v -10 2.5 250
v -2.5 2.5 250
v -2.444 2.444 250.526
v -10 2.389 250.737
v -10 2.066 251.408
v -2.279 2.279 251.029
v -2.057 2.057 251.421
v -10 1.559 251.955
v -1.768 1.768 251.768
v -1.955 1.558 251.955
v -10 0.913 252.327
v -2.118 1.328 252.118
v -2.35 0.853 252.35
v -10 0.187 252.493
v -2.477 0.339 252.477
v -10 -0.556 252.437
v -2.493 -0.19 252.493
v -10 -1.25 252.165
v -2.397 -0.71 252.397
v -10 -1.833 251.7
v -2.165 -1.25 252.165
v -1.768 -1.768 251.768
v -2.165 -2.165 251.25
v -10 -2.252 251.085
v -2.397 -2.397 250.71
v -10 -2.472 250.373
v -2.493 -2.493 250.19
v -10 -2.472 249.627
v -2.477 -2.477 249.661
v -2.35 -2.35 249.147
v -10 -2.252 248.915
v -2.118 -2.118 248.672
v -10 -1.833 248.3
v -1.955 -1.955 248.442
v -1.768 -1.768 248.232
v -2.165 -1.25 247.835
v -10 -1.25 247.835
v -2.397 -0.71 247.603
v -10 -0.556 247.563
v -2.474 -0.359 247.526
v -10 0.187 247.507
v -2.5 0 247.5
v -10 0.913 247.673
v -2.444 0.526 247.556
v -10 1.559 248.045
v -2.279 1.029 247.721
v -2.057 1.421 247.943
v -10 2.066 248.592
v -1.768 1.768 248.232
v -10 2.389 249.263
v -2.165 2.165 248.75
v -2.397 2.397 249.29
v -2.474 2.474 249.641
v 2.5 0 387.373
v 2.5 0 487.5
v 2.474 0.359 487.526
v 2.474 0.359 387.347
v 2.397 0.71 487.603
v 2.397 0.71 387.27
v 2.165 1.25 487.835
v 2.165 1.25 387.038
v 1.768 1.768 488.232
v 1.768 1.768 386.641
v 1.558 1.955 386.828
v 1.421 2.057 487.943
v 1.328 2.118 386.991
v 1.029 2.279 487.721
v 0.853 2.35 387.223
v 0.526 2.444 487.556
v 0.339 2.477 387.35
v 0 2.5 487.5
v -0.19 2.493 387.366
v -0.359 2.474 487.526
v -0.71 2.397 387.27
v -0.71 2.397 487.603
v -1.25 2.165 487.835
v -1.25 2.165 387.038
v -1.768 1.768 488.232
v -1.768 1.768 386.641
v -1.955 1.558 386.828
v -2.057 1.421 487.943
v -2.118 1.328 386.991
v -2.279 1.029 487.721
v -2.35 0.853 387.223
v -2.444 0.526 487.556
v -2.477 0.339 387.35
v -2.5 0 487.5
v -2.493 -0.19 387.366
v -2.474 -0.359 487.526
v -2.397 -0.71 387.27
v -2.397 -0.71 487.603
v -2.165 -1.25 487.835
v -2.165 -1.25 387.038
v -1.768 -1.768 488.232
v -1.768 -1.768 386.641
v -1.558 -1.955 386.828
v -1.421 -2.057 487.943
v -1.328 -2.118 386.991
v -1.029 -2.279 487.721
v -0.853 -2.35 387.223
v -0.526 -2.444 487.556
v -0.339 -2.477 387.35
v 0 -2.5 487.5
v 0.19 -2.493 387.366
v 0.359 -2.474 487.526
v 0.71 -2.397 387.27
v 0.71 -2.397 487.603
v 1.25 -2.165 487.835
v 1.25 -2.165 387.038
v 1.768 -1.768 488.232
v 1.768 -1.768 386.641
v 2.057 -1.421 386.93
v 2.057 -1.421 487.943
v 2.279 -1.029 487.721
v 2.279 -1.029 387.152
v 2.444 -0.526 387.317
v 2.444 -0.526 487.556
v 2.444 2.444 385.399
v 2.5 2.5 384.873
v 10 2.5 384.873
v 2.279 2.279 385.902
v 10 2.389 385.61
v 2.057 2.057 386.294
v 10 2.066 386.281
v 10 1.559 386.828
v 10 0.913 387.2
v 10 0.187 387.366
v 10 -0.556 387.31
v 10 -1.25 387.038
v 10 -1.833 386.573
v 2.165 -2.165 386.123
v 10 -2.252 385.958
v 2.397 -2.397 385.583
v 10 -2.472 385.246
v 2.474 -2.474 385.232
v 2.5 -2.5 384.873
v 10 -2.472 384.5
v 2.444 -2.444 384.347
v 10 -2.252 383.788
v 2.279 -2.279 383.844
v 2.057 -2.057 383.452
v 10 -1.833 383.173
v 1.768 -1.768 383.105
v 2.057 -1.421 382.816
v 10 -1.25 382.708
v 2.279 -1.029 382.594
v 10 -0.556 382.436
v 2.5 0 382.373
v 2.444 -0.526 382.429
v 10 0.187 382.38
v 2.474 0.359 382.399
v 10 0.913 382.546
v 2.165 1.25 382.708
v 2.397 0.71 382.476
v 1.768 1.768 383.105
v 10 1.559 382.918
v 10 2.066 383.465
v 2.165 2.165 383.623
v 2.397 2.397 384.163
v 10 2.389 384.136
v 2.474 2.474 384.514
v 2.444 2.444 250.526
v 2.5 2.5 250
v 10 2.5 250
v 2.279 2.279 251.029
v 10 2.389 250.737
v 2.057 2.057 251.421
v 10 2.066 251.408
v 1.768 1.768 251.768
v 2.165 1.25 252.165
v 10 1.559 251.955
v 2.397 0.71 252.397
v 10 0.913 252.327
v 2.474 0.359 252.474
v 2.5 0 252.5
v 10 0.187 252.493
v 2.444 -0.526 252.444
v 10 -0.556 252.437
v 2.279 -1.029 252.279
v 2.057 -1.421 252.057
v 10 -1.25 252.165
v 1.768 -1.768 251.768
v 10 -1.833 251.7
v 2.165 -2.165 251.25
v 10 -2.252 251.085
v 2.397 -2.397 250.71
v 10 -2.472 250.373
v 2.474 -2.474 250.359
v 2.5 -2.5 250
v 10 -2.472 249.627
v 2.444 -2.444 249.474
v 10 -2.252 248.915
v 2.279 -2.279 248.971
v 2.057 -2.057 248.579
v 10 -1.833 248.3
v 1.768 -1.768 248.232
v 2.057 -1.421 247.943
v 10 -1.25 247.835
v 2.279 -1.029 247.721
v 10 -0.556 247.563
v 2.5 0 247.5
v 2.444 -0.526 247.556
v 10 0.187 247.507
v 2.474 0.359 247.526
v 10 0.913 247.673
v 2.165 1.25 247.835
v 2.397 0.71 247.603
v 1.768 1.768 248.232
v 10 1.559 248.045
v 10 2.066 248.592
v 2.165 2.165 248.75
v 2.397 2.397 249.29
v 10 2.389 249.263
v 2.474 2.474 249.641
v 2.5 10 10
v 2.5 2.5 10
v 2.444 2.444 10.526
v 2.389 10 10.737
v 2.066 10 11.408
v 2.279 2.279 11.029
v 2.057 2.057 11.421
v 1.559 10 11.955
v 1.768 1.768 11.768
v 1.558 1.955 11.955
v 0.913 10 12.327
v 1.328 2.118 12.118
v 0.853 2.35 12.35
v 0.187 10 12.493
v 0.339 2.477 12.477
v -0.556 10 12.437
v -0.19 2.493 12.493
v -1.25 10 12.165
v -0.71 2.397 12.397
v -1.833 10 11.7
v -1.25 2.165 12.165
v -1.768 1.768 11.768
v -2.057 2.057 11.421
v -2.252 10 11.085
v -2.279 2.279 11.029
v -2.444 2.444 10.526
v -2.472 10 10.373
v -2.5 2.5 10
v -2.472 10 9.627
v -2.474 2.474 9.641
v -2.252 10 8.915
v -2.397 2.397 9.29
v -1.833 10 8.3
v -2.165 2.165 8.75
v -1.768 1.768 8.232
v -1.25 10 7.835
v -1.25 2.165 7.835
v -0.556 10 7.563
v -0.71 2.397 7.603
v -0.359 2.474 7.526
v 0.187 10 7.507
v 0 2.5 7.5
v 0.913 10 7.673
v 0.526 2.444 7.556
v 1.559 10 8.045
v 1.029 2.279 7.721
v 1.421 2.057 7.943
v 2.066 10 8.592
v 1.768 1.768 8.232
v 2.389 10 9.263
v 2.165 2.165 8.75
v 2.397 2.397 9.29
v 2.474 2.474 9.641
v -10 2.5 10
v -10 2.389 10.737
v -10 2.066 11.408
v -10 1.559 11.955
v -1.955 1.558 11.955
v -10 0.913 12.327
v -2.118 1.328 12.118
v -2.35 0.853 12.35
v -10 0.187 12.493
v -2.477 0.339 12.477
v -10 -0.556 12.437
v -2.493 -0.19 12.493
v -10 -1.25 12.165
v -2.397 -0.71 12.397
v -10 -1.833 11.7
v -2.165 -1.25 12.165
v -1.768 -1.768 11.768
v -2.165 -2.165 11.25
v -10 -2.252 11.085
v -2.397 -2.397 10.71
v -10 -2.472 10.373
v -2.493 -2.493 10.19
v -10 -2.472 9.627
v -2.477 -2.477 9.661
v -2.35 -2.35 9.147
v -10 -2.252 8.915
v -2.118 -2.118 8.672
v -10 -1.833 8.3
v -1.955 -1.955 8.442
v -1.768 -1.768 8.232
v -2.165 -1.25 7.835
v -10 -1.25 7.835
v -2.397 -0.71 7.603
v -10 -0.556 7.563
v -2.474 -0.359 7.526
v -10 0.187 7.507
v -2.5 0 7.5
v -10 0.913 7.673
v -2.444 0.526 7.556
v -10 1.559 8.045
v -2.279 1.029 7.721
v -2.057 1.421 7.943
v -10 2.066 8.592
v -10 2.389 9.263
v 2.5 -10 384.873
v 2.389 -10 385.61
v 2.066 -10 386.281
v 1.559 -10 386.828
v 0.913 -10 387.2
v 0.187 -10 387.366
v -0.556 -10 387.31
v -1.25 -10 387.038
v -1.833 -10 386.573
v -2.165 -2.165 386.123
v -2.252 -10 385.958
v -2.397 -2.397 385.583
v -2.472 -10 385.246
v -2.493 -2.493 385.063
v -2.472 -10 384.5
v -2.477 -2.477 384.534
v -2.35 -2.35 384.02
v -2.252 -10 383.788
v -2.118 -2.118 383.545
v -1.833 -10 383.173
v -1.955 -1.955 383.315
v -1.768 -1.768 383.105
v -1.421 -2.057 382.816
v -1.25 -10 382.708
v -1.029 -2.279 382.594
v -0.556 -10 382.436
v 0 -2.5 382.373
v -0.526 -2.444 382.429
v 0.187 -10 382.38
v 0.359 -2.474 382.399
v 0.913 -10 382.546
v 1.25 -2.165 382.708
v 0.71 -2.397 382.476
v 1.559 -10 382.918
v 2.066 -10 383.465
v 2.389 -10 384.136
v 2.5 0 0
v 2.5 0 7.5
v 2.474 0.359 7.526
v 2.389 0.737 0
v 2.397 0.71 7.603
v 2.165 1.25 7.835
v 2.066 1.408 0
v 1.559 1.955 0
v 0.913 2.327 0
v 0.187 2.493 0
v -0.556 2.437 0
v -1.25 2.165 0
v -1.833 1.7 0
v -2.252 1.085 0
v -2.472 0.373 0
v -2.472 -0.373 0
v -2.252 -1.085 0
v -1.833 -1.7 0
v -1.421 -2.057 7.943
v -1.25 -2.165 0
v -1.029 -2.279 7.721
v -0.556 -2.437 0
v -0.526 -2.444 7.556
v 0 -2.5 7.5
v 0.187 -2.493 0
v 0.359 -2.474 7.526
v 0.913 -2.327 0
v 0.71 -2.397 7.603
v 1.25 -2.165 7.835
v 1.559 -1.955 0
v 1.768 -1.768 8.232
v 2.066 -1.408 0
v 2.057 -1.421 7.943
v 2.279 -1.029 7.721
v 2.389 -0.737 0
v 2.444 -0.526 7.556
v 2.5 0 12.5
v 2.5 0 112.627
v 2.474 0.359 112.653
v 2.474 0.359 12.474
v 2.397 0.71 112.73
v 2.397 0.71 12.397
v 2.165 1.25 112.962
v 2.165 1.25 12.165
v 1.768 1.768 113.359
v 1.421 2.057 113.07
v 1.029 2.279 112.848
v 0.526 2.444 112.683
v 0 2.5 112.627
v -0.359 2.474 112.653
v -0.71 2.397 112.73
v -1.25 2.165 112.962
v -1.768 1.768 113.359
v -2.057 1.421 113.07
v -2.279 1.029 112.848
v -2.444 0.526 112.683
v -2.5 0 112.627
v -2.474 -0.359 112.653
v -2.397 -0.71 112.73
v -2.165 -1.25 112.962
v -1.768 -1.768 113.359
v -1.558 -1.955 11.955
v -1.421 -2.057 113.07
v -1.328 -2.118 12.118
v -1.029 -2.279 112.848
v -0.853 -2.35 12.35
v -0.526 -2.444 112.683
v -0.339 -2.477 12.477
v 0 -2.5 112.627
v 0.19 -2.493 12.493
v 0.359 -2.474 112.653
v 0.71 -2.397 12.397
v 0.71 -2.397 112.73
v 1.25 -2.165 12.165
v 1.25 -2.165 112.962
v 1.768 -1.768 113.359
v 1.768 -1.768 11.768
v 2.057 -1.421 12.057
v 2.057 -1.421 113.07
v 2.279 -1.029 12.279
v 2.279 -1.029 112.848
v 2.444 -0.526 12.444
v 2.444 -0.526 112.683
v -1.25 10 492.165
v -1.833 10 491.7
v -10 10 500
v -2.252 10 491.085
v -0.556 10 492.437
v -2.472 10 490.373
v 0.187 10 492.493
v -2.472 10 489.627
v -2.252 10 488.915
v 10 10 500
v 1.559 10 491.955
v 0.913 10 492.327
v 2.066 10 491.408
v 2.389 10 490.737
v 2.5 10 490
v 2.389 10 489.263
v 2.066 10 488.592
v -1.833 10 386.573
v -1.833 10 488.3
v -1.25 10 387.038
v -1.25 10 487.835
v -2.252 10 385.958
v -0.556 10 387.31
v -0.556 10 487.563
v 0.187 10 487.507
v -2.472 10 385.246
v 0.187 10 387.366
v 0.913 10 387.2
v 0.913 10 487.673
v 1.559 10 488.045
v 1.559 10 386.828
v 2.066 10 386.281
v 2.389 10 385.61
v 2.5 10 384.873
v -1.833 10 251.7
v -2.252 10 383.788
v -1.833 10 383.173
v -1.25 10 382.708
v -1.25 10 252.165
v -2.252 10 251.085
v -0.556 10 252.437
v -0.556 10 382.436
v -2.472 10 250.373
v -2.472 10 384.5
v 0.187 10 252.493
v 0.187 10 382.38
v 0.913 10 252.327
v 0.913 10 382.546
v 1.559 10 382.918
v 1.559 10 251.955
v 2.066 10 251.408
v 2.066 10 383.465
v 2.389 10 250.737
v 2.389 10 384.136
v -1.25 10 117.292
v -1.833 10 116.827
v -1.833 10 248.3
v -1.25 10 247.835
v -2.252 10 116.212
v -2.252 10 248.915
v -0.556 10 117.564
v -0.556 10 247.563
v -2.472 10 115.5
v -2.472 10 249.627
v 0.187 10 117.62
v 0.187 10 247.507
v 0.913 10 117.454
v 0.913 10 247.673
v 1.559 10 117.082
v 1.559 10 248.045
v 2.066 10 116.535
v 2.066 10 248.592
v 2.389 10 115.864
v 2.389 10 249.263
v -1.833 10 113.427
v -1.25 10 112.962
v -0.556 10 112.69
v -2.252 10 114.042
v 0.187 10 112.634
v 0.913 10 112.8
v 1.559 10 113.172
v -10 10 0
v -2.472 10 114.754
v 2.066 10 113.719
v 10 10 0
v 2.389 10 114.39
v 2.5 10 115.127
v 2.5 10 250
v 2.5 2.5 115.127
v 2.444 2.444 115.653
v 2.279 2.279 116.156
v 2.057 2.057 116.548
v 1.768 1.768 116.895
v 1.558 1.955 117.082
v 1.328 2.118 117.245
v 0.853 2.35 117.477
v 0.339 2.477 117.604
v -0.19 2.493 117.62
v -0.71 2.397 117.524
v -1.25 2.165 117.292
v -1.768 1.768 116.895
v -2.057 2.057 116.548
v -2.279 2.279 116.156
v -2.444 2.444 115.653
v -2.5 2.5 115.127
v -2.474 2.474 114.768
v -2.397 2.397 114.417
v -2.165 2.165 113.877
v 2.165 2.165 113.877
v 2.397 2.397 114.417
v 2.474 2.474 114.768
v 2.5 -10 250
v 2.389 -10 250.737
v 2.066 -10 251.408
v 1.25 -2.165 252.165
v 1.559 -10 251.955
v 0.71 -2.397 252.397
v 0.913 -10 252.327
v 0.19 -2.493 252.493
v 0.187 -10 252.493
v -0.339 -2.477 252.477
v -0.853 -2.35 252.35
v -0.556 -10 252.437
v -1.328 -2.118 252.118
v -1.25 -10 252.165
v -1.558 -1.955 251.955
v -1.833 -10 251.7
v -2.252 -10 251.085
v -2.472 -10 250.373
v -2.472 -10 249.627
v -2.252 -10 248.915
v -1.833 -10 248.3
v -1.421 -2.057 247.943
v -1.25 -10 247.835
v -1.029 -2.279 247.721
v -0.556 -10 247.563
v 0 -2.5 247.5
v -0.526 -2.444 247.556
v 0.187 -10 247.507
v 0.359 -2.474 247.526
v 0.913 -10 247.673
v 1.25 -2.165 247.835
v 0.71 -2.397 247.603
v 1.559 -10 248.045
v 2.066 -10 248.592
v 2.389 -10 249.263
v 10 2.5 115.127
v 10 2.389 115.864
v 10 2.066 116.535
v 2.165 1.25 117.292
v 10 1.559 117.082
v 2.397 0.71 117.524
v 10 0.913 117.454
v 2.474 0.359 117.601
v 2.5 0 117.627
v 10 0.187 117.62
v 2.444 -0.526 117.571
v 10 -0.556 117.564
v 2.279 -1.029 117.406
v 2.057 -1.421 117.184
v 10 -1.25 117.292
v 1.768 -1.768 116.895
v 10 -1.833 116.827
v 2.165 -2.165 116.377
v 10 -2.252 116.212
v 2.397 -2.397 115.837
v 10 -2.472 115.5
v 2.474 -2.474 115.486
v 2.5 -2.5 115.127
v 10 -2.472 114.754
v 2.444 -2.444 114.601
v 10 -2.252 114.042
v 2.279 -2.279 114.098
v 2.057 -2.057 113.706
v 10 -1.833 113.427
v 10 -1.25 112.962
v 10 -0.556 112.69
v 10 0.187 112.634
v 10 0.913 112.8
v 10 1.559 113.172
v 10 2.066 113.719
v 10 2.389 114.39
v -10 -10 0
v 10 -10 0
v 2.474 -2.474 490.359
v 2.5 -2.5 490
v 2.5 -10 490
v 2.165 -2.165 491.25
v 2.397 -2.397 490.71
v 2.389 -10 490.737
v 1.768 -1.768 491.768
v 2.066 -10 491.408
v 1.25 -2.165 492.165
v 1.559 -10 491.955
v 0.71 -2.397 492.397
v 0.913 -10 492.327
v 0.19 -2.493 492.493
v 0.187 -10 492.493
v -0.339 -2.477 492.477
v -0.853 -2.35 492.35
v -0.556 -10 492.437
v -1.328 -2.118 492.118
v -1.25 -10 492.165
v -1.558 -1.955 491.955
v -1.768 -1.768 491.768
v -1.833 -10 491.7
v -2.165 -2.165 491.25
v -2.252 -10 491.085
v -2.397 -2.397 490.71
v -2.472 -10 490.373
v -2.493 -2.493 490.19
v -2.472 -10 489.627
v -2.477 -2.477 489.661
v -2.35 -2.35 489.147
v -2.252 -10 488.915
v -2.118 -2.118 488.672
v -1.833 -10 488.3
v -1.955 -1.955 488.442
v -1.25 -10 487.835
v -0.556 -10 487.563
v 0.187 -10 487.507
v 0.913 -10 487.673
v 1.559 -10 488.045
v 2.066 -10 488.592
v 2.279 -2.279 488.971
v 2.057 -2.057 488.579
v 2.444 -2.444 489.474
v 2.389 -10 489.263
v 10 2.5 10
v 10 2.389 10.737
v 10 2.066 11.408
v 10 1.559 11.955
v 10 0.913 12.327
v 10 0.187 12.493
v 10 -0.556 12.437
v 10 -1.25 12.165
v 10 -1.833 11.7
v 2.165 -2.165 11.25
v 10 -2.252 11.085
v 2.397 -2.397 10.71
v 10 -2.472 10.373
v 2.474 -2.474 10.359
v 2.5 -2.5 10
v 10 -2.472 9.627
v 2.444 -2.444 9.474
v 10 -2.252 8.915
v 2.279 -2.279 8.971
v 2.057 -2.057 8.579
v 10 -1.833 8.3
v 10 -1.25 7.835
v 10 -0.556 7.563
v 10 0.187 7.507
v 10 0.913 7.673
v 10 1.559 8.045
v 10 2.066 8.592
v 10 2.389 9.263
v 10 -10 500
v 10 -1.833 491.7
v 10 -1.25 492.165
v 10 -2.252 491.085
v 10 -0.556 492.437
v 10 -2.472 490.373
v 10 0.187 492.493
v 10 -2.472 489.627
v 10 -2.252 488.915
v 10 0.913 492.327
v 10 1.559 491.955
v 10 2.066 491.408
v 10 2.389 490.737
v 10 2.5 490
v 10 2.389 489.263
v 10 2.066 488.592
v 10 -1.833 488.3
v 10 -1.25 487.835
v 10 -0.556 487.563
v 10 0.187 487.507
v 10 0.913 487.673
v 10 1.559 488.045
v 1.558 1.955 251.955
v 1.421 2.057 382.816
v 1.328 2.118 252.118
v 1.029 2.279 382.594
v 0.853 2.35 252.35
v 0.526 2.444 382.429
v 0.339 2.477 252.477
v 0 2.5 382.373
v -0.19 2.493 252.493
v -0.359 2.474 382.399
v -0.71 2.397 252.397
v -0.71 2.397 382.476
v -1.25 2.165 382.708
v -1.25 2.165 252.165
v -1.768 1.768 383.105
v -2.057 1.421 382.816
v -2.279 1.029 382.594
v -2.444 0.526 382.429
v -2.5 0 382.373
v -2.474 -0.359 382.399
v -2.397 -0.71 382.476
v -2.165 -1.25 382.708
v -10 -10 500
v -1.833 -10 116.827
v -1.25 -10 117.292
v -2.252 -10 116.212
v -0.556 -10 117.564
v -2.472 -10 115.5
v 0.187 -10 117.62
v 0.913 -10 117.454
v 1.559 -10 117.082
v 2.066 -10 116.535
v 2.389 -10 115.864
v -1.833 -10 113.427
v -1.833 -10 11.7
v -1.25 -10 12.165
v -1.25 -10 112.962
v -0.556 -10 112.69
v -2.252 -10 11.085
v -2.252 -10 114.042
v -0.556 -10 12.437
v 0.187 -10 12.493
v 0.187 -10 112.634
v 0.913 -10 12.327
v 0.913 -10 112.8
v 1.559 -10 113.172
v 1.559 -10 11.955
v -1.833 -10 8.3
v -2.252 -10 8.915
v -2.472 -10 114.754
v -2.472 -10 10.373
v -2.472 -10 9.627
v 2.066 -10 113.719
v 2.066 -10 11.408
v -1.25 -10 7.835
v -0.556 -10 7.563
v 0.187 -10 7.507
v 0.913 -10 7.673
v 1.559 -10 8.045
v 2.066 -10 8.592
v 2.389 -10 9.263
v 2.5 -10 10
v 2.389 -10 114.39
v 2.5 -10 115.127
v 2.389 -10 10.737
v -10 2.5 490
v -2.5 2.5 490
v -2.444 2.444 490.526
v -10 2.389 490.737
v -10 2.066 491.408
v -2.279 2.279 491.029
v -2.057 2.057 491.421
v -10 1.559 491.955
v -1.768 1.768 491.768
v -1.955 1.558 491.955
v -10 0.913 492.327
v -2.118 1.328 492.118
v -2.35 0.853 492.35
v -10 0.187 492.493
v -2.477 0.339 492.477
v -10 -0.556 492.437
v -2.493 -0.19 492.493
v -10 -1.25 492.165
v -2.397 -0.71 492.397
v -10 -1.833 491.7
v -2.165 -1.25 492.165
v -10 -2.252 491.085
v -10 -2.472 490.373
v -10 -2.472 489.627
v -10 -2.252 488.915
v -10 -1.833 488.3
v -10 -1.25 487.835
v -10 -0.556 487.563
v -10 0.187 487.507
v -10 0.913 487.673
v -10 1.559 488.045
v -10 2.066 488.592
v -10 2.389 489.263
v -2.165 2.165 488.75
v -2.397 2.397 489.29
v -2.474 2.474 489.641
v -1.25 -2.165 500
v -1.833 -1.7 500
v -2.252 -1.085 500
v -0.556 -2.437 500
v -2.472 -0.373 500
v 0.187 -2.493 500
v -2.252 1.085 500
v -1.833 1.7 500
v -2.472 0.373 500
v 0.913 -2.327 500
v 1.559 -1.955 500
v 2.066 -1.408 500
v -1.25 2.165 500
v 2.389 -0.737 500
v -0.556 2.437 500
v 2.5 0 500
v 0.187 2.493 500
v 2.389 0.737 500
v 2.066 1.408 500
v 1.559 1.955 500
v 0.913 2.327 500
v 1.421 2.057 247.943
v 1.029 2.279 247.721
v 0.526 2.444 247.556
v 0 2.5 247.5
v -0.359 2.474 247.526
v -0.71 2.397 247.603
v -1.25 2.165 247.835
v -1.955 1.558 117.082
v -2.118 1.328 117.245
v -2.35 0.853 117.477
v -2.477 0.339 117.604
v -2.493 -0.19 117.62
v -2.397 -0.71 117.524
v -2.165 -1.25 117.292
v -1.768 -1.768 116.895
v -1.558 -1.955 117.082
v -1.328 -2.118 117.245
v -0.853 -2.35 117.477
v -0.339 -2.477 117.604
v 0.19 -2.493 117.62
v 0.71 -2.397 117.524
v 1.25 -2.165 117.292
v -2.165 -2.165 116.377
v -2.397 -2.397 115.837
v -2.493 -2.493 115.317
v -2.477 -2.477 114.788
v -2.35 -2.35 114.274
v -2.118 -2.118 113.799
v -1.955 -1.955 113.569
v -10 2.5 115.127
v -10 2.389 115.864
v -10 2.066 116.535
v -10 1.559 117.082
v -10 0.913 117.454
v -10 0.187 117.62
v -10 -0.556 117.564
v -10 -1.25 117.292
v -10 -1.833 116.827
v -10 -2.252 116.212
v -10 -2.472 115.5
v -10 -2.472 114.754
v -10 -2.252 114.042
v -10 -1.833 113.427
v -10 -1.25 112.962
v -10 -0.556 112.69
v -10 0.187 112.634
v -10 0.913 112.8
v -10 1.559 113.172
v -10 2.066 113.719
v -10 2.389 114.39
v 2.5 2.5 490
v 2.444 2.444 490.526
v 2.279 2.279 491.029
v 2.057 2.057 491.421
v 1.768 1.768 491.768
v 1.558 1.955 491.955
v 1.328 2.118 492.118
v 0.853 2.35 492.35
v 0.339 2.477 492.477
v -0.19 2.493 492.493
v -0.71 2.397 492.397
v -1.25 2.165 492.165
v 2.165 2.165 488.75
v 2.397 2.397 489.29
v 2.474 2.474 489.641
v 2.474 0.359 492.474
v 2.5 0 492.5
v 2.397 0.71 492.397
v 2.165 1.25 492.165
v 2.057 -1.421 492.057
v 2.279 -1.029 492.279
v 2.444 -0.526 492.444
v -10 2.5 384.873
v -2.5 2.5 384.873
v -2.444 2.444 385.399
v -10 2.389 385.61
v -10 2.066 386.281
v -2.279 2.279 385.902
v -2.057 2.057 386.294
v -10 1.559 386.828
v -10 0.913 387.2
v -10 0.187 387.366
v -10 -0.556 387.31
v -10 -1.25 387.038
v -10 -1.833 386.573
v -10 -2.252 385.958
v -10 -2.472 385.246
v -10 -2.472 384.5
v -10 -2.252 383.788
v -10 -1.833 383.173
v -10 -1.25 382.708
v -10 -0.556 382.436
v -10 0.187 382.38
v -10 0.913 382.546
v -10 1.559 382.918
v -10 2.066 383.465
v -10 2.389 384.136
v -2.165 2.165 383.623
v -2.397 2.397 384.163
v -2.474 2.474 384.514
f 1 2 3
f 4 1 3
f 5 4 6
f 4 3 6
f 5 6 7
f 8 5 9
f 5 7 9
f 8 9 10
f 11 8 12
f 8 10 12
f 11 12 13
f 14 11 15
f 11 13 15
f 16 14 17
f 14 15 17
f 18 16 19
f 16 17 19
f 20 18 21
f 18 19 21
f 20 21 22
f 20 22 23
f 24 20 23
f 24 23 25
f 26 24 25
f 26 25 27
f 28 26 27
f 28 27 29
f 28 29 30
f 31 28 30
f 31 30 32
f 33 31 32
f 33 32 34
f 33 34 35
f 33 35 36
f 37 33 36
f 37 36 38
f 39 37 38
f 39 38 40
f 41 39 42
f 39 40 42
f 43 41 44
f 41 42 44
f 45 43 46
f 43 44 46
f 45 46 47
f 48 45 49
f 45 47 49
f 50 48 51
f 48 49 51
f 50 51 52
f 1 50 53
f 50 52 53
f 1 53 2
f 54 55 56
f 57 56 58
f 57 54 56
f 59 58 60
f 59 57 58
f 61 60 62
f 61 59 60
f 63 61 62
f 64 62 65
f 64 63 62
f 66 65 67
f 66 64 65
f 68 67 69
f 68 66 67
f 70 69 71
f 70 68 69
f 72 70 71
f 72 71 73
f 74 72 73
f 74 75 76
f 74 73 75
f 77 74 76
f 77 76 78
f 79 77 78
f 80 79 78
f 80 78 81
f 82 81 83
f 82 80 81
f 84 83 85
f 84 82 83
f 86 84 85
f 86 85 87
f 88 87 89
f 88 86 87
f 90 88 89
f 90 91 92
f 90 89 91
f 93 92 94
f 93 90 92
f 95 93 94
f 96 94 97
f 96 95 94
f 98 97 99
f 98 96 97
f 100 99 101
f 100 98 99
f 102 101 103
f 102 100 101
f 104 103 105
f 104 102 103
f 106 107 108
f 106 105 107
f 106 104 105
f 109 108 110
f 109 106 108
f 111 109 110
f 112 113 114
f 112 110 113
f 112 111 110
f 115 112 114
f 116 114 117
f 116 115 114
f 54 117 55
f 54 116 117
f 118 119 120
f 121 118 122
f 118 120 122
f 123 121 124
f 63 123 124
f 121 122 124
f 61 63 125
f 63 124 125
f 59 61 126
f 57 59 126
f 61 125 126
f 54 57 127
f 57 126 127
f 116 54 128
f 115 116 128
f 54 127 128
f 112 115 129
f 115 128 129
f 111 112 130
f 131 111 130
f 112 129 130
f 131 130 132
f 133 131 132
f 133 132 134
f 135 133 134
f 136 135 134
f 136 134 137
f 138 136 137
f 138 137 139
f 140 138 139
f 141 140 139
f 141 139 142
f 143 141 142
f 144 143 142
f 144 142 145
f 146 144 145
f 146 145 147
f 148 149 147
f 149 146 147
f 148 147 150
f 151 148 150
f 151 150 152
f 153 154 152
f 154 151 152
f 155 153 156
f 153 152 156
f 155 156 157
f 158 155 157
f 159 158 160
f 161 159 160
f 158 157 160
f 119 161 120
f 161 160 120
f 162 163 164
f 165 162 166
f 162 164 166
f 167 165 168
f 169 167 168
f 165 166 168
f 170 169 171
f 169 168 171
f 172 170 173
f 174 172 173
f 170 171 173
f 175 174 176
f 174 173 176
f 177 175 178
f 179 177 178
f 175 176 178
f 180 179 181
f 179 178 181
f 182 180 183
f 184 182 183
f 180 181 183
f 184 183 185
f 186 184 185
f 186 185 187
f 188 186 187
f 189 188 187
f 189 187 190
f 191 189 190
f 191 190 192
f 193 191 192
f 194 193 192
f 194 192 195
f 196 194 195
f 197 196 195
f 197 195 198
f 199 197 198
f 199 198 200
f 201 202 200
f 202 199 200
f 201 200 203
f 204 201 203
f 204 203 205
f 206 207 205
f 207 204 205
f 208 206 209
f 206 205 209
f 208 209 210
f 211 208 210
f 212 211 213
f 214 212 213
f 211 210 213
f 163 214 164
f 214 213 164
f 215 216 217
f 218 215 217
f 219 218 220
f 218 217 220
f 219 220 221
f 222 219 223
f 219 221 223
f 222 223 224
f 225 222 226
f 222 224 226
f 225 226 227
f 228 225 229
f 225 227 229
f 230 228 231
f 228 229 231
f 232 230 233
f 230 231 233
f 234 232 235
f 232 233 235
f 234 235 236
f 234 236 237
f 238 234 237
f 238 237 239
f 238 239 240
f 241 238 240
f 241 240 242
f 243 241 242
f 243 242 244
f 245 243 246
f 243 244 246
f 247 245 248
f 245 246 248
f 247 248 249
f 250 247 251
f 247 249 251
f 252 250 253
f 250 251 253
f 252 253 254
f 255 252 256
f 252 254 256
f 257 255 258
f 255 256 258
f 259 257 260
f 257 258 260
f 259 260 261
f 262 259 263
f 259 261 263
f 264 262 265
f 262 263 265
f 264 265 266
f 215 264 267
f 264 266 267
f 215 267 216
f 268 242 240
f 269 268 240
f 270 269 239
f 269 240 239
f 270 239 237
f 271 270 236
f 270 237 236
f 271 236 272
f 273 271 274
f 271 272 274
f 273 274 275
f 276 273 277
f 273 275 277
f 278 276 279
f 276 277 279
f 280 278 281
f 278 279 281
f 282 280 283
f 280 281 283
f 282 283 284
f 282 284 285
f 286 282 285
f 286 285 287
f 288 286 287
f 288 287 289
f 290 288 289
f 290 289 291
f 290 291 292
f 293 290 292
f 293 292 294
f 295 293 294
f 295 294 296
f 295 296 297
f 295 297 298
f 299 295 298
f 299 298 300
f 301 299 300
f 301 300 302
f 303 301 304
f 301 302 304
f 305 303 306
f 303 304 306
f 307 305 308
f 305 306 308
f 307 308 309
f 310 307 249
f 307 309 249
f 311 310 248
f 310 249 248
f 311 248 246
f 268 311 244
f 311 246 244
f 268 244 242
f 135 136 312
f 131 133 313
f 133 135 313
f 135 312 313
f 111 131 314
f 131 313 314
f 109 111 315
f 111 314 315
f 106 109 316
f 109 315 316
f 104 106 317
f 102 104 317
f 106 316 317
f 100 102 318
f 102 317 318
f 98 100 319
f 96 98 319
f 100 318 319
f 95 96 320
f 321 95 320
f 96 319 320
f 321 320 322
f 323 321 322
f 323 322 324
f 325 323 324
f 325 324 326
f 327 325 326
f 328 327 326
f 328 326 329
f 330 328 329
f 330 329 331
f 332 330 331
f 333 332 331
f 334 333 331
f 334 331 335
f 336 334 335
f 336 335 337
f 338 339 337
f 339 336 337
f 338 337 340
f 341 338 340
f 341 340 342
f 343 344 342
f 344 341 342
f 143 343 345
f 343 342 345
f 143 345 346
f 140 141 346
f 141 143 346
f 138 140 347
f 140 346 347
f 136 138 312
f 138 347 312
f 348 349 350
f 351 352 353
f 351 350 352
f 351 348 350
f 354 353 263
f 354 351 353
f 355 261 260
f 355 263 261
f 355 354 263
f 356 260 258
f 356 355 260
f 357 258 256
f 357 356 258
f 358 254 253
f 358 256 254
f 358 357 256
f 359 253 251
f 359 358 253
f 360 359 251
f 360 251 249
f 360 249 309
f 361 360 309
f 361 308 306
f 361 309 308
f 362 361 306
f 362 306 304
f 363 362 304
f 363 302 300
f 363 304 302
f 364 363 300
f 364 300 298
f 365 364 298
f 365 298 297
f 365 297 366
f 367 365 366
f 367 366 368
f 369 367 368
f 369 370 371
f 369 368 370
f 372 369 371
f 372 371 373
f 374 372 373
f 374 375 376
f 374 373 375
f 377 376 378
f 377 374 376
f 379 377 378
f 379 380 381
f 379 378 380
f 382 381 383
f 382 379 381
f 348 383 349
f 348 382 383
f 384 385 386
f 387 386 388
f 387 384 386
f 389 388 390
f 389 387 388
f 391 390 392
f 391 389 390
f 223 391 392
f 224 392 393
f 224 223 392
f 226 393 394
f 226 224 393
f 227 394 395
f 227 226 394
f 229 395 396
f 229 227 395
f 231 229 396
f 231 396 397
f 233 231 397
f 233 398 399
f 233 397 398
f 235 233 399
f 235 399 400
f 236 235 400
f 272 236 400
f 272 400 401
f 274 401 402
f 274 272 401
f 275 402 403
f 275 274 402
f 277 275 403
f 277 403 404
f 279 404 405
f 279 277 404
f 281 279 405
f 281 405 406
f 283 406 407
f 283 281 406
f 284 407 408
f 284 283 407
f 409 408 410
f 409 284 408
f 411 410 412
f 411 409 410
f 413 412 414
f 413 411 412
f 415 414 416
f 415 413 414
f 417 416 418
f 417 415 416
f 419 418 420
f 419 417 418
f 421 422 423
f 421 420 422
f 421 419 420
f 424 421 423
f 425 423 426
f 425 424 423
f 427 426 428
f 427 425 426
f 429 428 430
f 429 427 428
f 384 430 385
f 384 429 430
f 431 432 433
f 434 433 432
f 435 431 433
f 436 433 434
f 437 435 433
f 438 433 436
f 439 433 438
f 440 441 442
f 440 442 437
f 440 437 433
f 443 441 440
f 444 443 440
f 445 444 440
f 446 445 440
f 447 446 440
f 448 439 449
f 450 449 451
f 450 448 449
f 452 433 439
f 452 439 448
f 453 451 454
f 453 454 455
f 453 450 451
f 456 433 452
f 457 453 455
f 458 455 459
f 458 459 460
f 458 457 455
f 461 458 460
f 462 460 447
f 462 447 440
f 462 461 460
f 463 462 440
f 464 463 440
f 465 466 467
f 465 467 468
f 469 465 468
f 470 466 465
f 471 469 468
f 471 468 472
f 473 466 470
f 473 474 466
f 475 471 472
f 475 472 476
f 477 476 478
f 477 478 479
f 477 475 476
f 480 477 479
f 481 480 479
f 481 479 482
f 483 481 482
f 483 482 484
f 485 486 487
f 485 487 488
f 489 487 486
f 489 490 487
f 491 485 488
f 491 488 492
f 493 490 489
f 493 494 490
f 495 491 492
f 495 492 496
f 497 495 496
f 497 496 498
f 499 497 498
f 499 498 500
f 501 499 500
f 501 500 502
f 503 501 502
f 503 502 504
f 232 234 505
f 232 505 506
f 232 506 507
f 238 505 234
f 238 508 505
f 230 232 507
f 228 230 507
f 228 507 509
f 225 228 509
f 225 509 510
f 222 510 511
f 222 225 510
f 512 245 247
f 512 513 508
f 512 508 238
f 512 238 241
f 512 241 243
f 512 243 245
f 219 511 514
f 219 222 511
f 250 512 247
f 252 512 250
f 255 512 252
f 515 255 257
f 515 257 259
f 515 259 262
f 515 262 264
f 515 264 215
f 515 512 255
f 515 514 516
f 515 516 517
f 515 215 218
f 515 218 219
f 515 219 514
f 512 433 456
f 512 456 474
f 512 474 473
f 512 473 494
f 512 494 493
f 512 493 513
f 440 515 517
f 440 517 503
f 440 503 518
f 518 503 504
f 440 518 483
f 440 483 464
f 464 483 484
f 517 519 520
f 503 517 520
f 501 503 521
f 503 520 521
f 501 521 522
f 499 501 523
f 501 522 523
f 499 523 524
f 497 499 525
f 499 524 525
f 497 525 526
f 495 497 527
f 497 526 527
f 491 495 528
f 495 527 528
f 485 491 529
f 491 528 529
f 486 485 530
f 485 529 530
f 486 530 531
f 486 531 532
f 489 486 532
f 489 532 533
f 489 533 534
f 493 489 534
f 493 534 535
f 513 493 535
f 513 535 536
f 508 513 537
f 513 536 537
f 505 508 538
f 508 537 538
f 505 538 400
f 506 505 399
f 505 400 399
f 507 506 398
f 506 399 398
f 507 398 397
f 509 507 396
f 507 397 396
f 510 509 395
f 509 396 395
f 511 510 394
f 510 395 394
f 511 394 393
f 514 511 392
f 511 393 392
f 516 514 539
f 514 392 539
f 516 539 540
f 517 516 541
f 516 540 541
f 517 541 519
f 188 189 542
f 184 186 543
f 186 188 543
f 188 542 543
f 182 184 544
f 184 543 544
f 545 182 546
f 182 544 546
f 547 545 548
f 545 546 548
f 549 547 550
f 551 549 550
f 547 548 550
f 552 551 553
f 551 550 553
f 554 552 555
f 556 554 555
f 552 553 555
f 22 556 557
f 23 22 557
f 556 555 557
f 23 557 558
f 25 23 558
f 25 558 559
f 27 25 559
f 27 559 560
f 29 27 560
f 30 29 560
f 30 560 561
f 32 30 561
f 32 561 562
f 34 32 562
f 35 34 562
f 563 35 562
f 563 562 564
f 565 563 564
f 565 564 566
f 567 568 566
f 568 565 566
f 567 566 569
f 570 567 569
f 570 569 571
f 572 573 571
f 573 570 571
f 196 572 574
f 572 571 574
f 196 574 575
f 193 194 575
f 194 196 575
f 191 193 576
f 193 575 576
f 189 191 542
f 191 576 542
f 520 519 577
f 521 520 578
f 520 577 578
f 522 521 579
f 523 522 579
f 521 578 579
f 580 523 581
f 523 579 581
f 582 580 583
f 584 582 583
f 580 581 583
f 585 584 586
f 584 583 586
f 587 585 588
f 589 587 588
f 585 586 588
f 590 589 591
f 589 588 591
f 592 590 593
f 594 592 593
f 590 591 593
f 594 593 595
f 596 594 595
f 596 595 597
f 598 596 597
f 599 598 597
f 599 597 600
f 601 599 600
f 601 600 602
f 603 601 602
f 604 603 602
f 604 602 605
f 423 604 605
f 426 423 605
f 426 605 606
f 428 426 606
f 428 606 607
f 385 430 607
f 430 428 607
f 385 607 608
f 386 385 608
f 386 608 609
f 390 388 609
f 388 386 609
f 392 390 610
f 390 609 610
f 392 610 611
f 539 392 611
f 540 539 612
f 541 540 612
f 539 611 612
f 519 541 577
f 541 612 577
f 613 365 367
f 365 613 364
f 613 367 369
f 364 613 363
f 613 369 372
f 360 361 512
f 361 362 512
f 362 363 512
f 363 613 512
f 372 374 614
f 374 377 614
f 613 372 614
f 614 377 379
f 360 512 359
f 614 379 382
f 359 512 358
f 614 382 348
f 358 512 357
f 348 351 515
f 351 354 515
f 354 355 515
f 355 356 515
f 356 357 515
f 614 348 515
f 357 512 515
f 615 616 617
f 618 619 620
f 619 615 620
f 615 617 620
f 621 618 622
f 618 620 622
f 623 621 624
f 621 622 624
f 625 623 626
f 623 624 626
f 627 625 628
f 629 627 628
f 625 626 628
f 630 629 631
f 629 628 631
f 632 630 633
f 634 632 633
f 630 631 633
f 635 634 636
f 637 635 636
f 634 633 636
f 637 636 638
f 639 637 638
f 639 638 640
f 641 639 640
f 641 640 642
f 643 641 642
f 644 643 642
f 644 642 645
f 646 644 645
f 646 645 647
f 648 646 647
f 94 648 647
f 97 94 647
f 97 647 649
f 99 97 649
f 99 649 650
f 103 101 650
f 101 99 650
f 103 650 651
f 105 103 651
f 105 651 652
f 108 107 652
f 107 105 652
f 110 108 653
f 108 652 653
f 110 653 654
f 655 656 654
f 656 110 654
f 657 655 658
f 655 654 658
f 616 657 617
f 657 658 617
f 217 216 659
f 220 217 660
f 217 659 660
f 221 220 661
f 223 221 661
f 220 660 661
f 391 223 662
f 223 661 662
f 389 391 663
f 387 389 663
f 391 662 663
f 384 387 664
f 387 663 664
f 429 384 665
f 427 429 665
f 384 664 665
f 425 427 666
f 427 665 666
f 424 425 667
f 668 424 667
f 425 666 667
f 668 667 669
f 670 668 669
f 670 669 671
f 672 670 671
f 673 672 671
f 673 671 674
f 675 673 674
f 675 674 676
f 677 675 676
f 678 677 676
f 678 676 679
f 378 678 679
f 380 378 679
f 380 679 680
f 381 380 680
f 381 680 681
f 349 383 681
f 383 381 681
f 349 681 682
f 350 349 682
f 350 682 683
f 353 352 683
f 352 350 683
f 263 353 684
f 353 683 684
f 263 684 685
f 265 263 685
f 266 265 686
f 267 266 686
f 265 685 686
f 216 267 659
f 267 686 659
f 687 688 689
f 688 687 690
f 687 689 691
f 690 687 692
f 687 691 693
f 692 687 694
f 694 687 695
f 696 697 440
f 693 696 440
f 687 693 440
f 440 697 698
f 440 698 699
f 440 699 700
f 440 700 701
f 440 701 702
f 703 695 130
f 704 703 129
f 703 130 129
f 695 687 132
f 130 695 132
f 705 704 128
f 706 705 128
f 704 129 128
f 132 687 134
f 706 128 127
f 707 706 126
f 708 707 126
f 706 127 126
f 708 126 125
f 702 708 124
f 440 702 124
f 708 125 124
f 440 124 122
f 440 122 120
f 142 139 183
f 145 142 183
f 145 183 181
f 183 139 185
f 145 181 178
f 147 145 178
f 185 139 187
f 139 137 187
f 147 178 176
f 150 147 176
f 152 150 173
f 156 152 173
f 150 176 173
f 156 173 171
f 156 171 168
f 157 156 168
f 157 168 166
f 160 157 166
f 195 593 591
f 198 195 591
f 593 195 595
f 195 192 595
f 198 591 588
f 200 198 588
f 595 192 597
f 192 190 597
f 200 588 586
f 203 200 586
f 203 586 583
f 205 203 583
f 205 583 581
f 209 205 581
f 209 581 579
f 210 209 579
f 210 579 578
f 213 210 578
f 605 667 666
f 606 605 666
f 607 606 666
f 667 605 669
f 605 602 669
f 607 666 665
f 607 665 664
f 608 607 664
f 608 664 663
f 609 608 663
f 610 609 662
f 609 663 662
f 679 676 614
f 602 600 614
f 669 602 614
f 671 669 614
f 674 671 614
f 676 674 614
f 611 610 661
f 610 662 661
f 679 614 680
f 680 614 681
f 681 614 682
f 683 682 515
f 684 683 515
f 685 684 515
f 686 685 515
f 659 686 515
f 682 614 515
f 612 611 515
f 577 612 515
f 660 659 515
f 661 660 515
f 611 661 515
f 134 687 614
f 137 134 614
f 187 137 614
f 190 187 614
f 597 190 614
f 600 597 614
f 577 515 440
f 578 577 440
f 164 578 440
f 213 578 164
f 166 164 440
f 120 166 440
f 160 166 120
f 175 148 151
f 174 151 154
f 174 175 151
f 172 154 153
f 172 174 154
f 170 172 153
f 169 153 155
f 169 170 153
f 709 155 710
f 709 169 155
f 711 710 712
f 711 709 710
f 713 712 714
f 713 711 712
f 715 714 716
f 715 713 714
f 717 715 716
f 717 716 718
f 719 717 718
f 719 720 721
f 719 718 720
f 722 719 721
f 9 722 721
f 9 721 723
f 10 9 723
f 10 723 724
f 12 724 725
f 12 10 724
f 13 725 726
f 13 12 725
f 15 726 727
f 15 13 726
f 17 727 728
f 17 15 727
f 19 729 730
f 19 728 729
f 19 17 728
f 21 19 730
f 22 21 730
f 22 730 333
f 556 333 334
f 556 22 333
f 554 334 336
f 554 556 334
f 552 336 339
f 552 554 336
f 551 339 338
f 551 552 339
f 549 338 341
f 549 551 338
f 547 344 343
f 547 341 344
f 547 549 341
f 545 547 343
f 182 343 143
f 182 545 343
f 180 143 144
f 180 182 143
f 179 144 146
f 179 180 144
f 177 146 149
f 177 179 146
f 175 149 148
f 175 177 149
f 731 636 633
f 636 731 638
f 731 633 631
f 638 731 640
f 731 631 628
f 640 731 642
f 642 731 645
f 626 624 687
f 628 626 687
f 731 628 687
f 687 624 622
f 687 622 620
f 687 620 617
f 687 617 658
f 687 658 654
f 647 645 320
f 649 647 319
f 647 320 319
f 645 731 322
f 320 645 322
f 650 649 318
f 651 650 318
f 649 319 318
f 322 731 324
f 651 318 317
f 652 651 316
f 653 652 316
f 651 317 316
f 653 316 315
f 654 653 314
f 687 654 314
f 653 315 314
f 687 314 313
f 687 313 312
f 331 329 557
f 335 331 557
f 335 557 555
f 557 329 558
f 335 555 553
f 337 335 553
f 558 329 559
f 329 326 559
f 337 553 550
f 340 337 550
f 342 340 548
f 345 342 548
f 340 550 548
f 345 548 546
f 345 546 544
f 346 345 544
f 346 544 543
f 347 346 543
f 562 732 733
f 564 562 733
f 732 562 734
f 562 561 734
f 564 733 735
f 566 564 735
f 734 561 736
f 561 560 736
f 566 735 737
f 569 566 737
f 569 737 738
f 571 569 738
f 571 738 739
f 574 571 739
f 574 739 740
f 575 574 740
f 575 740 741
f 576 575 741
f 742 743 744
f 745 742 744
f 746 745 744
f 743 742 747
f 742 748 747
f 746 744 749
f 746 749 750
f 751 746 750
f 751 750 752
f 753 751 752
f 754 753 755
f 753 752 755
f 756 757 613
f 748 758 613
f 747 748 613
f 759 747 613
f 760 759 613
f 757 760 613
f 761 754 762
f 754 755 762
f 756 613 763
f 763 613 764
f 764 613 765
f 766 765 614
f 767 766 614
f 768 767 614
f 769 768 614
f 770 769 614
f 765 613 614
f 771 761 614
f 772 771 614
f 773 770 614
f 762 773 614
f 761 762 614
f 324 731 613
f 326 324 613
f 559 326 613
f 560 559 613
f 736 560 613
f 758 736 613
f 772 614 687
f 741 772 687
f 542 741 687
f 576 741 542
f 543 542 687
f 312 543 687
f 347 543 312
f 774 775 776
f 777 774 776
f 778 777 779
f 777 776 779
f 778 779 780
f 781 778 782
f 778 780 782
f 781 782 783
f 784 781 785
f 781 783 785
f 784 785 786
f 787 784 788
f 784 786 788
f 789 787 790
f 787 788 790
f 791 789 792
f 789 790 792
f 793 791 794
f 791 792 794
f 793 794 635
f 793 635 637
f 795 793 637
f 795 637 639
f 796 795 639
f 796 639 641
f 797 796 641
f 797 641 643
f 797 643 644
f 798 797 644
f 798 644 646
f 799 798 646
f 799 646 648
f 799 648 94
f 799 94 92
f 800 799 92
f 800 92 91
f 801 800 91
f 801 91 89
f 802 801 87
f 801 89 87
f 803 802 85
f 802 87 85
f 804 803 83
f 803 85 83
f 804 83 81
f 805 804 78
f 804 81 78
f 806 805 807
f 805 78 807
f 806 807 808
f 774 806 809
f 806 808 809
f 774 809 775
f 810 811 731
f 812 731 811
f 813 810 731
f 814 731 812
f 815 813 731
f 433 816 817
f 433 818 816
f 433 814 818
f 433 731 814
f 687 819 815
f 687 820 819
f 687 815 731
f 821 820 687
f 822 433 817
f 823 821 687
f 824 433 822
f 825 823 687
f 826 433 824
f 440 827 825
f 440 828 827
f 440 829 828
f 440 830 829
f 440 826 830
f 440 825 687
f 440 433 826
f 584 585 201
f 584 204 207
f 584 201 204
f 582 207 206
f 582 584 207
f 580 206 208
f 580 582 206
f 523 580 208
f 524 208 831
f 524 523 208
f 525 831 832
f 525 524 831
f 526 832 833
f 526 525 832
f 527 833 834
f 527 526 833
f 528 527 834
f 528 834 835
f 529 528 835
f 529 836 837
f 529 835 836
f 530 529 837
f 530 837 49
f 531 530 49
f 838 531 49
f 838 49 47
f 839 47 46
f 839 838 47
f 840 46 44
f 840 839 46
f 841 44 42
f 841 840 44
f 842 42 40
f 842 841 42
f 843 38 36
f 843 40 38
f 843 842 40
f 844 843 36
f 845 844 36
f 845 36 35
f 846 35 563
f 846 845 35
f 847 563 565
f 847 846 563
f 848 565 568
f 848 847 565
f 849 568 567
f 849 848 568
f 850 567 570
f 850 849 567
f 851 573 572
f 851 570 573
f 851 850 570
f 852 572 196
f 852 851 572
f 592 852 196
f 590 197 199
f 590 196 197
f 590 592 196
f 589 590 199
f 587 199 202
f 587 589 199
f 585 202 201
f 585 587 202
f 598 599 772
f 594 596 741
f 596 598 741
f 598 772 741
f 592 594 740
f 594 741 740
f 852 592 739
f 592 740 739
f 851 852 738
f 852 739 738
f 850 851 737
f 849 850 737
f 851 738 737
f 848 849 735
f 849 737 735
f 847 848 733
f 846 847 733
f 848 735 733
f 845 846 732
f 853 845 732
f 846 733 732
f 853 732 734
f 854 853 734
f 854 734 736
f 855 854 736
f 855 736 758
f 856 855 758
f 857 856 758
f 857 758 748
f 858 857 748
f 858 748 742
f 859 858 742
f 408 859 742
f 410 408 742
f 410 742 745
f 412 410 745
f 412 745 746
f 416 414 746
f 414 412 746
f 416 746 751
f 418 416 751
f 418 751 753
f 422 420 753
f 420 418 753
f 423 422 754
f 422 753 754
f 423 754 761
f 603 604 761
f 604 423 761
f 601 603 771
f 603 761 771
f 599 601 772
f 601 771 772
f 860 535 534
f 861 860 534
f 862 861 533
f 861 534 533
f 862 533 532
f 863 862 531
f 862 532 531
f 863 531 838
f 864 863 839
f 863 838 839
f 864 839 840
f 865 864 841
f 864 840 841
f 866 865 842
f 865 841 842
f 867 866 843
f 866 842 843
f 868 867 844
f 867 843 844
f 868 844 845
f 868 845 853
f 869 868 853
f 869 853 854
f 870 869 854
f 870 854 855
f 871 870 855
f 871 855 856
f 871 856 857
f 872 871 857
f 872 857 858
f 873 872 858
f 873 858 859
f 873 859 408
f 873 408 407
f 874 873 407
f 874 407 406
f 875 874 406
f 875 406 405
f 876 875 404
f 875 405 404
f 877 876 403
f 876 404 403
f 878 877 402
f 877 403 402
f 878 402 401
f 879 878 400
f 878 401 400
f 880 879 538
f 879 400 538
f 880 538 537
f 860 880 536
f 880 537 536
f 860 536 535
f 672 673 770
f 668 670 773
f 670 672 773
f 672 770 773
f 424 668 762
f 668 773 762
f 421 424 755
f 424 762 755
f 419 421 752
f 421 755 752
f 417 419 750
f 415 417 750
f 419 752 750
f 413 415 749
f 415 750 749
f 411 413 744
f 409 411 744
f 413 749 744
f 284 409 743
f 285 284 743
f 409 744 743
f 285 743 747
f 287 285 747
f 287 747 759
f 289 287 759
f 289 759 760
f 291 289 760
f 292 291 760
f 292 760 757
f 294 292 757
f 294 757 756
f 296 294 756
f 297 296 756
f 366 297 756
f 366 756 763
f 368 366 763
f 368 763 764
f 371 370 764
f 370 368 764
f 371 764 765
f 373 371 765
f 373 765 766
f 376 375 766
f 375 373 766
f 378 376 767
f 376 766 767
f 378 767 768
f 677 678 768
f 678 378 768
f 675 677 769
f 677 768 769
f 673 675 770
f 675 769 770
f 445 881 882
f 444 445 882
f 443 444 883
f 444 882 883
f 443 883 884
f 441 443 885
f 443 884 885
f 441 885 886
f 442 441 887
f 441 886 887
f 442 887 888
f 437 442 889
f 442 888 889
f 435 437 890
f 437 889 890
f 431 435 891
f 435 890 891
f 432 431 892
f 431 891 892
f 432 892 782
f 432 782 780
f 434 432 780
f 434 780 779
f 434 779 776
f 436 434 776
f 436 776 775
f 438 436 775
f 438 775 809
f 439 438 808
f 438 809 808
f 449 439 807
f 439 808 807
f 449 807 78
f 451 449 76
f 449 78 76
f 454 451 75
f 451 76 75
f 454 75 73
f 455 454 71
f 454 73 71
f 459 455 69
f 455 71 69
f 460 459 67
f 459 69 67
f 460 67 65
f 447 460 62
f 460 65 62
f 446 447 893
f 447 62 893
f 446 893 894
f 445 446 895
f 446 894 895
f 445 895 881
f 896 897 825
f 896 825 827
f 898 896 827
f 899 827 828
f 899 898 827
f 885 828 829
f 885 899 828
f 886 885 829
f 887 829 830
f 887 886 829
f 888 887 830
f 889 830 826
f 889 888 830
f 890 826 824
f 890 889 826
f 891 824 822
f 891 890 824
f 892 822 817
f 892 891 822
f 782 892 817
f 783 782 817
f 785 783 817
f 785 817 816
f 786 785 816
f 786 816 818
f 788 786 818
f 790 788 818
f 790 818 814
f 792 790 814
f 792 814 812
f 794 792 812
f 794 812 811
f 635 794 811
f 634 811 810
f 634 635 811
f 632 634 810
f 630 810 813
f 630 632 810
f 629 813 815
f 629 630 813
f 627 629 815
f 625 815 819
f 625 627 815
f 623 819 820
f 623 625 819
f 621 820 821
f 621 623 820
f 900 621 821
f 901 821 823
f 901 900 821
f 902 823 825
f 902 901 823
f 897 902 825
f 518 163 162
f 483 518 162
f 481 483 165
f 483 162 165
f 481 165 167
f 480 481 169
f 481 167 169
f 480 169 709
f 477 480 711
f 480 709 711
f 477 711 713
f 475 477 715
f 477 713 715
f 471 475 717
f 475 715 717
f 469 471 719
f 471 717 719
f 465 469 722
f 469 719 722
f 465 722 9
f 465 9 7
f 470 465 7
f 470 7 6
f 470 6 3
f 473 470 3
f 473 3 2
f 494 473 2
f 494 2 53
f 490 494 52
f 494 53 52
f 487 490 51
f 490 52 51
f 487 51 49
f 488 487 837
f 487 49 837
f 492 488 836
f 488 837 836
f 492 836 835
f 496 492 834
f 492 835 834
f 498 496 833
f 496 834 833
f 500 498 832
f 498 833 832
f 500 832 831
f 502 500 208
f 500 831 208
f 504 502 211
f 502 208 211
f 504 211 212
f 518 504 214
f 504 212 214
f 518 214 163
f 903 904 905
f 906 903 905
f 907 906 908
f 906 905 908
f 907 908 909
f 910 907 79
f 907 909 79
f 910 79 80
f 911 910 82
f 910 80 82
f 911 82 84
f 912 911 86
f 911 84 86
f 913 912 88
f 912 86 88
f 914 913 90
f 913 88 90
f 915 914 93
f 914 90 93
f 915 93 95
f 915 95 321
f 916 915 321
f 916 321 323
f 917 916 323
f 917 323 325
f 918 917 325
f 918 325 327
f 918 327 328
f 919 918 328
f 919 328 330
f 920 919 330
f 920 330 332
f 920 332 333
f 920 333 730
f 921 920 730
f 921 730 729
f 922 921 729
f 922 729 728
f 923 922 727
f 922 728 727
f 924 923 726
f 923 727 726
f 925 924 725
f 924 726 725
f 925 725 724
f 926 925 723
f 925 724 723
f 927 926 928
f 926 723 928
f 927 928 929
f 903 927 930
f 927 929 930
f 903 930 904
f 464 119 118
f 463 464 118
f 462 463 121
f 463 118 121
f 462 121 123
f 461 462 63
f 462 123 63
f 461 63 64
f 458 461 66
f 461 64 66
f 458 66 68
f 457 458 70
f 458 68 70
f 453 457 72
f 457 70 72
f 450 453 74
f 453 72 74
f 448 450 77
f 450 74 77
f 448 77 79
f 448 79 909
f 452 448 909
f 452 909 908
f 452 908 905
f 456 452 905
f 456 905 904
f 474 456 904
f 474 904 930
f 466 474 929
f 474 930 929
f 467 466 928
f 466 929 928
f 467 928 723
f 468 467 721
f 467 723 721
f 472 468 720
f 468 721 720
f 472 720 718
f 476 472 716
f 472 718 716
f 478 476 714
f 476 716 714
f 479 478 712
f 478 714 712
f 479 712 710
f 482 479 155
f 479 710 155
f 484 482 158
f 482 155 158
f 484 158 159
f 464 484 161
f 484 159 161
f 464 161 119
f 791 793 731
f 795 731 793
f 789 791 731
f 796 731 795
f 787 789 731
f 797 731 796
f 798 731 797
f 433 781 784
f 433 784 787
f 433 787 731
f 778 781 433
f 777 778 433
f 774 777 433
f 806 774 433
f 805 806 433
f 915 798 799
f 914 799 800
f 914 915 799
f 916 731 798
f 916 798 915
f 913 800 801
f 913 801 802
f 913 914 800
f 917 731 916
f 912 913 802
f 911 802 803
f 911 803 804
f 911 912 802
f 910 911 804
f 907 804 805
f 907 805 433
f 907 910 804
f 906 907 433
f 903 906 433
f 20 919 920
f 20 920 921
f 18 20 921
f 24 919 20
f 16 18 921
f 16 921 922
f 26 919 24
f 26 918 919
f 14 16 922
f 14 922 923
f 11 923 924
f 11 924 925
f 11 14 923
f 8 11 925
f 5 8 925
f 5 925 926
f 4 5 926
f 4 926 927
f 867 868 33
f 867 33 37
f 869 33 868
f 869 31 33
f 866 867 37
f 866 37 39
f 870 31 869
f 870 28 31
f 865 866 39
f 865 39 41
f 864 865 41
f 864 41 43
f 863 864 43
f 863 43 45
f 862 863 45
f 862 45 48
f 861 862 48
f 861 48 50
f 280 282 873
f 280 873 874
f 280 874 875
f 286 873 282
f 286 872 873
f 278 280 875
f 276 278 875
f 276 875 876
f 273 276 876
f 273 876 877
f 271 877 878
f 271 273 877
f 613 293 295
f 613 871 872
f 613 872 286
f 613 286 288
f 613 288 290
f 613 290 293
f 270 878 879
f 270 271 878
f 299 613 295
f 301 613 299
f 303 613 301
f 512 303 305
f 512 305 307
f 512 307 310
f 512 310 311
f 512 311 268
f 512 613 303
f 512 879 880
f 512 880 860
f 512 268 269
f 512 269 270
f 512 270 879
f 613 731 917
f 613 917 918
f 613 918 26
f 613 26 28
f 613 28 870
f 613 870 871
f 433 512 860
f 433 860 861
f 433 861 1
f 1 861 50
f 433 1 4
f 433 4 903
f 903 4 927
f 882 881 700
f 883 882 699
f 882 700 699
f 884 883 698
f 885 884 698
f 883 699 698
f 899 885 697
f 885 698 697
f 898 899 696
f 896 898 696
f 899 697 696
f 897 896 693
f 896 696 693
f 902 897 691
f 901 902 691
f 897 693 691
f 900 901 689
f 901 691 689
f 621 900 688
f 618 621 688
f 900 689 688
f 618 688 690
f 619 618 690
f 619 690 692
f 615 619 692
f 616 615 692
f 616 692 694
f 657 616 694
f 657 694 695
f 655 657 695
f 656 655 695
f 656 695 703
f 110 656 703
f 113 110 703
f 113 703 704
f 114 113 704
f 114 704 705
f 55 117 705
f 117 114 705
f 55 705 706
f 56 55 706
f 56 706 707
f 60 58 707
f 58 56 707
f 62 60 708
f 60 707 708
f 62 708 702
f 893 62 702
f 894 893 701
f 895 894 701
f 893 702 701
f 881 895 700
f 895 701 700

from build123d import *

# Parameters (mm, degrees)
F0_W     = 20
F0_H     = 20
F0_R     = 2.5
F1_DEPTH = 500
F2_R     = 2.5
F3_DEPTH = 20.001
F4_R     = 2.5
F5_DEPTH = 20.001


with BuildPart() as f1:
    # F0 (on Top) → F1 (new body)
    with BuildSketch(Plane.XY):
        Rectangle(F0_W, F0_H)
        Circle(F0_R, mode=Mode.SUBTRACT)
    extrude(amount=F1_DEPTH)

    # F2 (on face) → F3 (cut, through all)
    with BuildSketch(Plane.YZ.offset(10)):
        with Locations((0, 10)):
            Circle(F2_R)
        with Locations((0, 490)):
            Circle(F2_R)
        with Locations((0, 250)):
            Circle(F2_R)
        with Locations((0, 115.127)):
            Circle(F2_R)
        with Locations((0, 384.873)):
            Circle(F2_R)
    extrude(amount=-F3_DEPTH, mode=Mode.SUBTRACT)

    # F4 (on face) → F5 (cut, through all)
    with BuildSketch(Plane.XZ.offset(10)):
        with Locations((0, 250)):
            Circle(F4_R)
        with Locations((0, 490)):
            Circle(F4_R)
        with Locations((0, 10)):
            Circle(F4_R)
        with Locations((0, 115.127)):
            Circle(F4_R)
        with Locations((0, 384.873)):
            Circle(F4_R)
    extrude(amount=-F5_DEPTH, mode=Mode.SUBTRACT)


solid = f1.part
